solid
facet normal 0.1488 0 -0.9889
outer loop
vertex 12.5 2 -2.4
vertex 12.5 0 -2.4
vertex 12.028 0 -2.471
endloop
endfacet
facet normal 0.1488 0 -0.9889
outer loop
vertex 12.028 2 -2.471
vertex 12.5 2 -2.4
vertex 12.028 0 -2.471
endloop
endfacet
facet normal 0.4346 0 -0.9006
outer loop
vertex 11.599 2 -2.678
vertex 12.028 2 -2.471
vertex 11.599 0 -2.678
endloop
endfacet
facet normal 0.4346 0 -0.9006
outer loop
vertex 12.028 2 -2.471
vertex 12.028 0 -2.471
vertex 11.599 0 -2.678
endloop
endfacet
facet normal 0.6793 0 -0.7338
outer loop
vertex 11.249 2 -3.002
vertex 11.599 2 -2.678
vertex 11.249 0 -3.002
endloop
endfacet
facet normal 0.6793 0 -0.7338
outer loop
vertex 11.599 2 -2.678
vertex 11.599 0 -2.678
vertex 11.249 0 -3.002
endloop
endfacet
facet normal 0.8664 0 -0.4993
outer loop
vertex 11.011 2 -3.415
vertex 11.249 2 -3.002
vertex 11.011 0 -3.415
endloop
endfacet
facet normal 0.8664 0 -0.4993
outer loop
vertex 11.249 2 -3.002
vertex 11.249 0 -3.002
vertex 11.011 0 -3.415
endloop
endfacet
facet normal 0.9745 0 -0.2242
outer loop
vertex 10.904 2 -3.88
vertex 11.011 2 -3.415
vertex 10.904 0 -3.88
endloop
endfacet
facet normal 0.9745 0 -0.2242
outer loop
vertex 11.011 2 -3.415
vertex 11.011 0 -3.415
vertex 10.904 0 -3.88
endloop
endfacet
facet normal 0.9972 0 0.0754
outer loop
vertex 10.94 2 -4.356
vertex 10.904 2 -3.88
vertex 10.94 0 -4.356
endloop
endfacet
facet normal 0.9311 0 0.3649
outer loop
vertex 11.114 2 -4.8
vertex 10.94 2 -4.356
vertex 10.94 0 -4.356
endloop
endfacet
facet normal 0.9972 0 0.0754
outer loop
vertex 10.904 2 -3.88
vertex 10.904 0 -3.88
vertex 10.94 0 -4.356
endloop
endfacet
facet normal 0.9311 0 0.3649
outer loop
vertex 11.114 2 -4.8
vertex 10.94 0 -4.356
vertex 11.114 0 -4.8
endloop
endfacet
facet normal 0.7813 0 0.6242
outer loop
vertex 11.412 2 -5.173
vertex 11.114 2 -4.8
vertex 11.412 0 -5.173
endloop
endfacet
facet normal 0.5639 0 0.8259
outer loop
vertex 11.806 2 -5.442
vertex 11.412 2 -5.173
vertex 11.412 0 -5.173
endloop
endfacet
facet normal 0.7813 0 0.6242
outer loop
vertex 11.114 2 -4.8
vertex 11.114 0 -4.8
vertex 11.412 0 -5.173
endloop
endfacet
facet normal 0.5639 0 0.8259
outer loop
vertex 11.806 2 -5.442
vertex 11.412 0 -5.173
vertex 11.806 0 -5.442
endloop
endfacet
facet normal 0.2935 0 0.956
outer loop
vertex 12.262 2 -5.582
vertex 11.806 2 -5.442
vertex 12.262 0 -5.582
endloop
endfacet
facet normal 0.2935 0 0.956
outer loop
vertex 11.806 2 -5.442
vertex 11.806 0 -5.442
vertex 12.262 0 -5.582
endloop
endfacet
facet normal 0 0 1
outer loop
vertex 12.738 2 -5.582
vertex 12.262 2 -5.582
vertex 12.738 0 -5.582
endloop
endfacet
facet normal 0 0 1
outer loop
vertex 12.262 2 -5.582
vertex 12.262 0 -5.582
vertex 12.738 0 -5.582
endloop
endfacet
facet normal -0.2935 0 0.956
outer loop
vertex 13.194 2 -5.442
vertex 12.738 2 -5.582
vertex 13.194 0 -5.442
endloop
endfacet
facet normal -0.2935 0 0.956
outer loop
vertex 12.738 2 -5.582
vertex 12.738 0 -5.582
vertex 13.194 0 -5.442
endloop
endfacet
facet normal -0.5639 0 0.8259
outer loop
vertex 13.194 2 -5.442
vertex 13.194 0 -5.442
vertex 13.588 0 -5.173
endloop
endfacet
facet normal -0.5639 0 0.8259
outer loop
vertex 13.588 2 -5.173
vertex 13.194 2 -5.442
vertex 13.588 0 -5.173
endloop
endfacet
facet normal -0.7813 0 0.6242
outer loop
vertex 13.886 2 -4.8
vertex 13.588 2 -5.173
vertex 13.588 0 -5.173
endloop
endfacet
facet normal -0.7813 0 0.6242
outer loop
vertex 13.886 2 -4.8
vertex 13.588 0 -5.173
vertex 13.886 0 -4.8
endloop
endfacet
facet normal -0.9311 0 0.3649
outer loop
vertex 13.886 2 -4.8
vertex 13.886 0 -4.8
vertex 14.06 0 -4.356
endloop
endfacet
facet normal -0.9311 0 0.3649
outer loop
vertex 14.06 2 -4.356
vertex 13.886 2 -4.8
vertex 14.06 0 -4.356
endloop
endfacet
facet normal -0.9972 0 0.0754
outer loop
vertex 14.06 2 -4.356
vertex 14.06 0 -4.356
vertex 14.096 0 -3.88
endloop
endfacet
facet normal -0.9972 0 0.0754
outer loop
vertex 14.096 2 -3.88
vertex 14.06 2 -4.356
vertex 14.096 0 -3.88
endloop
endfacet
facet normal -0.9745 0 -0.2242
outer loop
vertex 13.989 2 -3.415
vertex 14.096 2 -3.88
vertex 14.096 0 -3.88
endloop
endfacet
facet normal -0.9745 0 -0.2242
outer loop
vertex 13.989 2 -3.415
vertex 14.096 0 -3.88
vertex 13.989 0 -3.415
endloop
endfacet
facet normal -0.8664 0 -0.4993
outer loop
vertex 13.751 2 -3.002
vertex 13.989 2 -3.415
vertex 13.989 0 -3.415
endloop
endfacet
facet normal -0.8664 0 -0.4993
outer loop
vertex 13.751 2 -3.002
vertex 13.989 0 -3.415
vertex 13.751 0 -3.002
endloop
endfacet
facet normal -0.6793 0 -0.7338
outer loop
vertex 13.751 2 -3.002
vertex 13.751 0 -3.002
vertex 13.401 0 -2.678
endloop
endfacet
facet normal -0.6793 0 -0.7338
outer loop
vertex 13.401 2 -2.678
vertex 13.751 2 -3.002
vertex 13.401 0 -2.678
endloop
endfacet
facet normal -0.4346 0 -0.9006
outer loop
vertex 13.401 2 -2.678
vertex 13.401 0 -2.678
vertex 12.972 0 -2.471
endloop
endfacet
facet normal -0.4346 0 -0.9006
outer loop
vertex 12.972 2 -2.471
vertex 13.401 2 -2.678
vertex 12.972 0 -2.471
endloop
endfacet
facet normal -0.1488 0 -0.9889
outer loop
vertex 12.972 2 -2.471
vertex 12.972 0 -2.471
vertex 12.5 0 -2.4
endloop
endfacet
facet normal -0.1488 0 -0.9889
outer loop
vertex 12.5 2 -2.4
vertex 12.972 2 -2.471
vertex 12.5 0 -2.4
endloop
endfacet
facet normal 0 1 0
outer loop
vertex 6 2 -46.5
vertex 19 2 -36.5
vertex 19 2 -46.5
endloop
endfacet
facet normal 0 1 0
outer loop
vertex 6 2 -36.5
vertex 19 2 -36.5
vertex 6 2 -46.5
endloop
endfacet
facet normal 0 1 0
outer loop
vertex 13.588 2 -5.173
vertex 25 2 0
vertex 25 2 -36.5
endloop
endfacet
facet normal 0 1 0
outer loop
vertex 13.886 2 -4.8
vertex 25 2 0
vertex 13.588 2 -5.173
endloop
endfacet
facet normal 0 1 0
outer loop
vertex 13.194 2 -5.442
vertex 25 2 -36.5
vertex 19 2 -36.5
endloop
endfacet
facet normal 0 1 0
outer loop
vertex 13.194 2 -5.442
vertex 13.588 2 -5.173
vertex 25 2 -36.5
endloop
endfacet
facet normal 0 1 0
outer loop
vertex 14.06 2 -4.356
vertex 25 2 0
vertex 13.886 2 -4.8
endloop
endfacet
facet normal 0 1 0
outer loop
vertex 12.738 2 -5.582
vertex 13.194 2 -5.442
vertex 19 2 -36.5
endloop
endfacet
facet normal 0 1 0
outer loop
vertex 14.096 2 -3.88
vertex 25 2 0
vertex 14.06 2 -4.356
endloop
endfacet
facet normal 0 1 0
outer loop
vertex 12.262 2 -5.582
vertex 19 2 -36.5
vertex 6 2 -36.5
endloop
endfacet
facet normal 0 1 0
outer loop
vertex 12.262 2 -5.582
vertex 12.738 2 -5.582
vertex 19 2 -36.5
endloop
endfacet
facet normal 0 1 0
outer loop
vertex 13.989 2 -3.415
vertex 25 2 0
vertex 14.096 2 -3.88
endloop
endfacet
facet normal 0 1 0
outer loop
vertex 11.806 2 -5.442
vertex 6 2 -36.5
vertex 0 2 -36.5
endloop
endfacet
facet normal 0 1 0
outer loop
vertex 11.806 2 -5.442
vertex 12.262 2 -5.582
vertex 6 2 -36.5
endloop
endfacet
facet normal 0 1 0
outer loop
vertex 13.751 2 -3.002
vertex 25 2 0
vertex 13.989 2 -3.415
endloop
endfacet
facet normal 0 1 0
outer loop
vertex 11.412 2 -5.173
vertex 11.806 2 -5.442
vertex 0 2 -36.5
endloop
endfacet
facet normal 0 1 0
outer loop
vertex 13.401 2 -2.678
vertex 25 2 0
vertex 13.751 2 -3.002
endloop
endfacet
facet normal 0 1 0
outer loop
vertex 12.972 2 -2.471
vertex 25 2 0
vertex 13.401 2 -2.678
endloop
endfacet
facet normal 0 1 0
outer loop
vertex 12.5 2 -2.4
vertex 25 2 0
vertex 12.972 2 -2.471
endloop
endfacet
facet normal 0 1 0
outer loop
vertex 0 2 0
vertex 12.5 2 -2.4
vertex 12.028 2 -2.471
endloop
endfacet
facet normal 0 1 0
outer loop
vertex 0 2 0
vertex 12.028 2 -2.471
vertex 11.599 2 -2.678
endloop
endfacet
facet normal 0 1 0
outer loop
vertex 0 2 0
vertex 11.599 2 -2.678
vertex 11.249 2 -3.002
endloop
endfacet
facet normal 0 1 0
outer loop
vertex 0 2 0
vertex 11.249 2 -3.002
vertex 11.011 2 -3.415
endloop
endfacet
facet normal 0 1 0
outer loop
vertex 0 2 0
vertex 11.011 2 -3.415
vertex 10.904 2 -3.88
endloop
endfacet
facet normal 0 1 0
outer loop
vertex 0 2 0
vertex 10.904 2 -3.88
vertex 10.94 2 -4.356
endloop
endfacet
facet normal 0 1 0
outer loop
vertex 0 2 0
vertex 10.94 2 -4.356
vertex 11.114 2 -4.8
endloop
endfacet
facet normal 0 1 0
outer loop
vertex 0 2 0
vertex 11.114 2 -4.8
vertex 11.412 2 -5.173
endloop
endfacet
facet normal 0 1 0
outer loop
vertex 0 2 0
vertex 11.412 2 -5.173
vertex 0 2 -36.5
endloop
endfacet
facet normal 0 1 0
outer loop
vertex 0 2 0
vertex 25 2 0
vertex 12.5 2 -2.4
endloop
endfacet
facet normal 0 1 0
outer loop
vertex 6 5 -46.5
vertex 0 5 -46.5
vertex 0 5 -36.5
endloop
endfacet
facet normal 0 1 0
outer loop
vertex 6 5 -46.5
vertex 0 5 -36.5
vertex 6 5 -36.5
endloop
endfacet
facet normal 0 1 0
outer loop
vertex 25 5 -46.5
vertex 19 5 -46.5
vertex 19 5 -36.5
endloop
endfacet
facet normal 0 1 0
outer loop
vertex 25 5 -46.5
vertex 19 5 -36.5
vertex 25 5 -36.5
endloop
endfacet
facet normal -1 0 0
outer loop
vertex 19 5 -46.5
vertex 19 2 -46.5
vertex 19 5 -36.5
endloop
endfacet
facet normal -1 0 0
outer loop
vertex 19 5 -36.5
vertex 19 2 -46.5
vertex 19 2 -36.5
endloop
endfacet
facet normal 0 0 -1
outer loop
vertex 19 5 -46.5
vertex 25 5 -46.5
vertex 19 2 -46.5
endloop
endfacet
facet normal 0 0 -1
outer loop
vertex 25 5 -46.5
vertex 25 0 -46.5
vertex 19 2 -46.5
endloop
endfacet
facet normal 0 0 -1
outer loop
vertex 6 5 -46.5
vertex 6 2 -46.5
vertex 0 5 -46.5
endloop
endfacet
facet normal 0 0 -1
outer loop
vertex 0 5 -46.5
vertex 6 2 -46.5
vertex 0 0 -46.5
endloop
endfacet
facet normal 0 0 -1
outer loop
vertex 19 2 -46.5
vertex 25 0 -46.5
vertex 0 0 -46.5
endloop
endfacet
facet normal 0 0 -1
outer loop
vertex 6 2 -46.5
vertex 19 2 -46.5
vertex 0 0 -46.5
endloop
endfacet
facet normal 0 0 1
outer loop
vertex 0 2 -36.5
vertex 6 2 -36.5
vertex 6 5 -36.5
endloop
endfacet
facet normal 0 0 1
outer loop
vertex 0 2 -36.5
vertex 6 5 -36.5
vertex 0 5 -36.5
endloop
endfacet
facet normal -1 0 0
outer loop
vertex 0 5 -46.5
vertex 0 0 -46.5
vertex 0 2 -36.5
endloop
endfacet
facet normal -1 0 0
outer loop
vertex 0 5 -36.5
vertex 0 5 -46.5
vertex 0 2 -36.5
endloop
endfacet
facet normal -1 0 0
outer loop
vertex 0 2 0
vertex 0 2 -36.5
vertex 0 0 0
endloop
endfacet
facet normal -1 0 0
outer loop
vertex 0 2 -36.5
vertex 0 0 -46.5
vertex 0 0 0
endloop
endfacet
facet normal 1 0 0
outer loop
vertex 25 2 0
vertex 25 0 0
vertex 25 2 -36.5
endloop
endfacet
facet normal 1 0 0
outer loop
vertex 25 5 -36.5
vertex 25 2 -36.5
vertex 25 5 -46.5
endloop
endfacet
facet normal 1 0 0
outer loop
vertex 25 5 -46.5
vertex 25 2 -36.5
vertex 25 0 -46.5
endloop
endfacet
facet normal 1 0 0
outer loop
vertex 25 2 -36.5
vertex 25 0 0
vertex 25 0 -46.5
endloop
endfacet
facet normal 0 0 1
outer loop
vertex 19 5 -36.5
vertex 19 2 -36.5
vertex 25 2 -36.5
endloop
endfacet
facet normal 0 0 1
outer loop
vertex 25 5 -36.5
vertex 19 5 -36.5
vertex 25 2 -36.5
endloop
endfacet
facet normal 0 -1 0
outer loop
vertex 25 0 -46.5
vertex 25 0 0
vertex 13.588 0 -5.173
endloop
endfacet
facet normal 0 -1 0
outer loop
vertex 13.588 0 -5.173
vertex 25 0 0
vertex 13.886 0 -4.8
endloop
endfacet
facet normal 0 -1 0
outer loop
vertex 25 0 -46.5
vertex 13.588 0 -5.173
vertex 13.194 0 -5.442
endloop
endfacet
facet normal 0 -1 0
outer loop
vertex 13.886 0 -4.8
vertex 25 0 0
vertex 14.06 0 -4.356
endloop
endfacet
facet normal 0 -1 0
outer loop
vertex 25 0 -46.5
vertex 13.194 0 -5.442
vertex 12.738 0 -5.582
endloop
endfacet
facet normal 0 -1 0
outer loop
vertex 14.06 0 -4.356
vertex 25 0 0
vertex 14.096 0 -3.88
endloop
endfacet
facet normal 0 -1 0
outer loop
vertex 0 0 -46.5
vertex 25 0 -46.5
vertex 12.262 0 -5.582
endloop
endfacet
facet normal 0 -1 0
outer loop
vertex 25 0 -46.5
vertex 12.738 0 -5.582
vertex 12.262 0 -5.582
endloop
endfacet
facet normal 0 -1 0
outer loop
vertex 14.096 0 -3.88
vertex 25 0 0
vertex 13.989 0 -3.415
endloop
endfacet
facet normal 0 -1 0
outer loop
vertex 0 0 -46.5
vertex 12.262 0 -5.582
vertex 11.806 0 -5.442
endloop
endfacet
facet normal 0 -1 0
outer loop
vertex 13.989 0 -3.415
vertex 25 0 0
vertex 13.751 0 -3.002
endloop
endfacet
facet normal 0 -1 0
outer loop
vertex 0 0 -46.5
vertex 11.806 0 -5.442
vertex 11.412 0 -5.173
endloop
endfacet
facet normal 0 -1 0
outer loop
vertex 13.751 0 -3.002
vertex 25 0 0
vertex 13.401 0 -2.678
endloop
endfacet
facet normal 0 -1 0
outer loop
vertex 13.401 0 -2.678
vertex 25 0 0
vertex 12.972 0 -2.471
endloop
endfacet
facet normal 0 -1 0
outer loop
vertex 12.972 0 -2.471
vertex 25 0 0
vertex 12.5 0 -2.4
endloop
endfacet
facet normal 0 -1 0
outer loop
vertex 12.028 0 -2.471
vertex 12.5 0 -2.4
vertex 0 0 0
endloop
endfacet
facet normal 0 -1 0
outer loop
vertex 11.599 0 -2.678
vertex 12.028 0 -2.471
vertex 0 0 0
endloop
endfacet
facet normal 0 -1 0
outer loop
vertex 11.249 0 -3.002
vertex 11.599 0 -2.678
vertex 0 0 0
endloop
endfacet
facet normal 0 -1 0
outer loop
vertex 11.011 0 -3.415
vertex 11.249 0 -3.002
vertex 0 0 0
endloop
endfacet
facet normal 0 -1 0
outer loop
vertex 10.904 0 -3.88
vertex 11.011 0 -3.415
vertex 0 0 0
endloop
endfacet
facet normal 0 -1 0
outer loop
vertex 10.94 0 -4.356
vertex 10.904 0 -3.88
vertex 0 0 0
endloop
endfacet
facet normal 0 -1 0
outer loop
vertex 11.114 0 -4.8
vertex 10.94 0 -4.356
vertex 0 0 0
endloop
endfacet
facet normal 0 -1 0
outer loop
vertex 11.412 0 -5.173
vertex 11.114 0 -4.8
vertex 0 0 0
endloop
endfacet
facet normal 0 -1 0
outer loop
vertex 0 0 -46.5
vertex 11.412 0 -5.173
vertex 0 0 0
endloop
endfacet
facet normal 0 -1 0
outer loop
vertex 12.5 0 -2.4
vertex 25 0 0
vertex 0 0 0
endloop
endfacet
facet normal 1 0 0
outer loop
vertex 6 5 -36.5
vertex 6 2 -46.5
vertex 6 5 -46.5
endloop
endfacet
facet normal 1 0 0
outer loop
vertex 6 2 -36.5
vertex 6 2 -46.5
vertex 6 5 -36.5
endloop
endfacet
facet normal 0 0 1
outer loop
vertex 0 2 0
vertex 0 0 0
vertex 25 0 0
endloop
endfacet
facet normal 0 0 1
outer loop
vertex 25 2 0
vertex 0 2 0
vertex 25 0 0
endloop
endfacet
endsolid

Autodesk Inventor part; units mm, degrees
ref_plane "YZ Plane" through (0, 0, 0) normal (1, 0, 0) x (0, 1, 0)
ref_plane "XZ Plane" through (0, 0, 0) normal (0, 1, 0) x (-1, 0, 0)
ref_plane "XY Plane" through (0, 0, 0) normal (0, 0, 1) x (1, 0, 0)
sketch "Sketch1" plane through (0, 0, 0) normal (0, 1, 0) x (-1, 0, 0)
  line L0 (0, 0) -> (-25, 0)
  line L1 (-25, 0) -> (-25, -46.5)
  line L2 (-25, -46.5) -> (0, -46.5)
  line L3 (0, -46.5) -> (0, 0)
  dimension "d0" = 25
  dimension "d1" = 46.5
extrude "Extrusion1" add sketch "Sketch1" along normal blind 2
sketch "Sketch2" plane through (0, 2, 0) normal (0, 1, 0) x (1, 0, 0)
  line L0 (25, 46.5) -> (0, 46.5) projected
  line L1 (0, 46.5) -> (6, 46.5)
  line L2 (6, 46.5) -> (6, 36.5)
  line L3 (6, 36.5) -> (0, 36.5)
  line L4 (0, 36.5) -> (0, 46.5)
  line L5 (25, 46.5) -> (19, 46.5)
  line L6 (19, 46.5) -> (19, 36.5)
  line L7 (19, 36.5) -> (25, 36.5)
  line L8 (25, 36.5) -> (25, 46.5)
  point P0 (0, 0)
  dimension "d4" = 6
  dimension "d5" = 10
  dimension "d6" = 6
extrude "Extrusion2" add sketch "Sketch2" along normal blind 3
sketch "Sketch4" plane through (0, 2, 0) normal (0, 1, 0) x (1, 0, 0)
  line L0 (0, 0) -> (25, 0) projected
  line L1 (25, 0) -> (25, 36.5) projected
  point P0 (12.5, 4)
  dimension "d18" = 4
  dimension "d19" = 12.5
hole "Hole2" at (12.5, 2, -4) direction (0, -1, 0) diameter 3.2 end through all
properties part number "mlx_mount_3mm"
